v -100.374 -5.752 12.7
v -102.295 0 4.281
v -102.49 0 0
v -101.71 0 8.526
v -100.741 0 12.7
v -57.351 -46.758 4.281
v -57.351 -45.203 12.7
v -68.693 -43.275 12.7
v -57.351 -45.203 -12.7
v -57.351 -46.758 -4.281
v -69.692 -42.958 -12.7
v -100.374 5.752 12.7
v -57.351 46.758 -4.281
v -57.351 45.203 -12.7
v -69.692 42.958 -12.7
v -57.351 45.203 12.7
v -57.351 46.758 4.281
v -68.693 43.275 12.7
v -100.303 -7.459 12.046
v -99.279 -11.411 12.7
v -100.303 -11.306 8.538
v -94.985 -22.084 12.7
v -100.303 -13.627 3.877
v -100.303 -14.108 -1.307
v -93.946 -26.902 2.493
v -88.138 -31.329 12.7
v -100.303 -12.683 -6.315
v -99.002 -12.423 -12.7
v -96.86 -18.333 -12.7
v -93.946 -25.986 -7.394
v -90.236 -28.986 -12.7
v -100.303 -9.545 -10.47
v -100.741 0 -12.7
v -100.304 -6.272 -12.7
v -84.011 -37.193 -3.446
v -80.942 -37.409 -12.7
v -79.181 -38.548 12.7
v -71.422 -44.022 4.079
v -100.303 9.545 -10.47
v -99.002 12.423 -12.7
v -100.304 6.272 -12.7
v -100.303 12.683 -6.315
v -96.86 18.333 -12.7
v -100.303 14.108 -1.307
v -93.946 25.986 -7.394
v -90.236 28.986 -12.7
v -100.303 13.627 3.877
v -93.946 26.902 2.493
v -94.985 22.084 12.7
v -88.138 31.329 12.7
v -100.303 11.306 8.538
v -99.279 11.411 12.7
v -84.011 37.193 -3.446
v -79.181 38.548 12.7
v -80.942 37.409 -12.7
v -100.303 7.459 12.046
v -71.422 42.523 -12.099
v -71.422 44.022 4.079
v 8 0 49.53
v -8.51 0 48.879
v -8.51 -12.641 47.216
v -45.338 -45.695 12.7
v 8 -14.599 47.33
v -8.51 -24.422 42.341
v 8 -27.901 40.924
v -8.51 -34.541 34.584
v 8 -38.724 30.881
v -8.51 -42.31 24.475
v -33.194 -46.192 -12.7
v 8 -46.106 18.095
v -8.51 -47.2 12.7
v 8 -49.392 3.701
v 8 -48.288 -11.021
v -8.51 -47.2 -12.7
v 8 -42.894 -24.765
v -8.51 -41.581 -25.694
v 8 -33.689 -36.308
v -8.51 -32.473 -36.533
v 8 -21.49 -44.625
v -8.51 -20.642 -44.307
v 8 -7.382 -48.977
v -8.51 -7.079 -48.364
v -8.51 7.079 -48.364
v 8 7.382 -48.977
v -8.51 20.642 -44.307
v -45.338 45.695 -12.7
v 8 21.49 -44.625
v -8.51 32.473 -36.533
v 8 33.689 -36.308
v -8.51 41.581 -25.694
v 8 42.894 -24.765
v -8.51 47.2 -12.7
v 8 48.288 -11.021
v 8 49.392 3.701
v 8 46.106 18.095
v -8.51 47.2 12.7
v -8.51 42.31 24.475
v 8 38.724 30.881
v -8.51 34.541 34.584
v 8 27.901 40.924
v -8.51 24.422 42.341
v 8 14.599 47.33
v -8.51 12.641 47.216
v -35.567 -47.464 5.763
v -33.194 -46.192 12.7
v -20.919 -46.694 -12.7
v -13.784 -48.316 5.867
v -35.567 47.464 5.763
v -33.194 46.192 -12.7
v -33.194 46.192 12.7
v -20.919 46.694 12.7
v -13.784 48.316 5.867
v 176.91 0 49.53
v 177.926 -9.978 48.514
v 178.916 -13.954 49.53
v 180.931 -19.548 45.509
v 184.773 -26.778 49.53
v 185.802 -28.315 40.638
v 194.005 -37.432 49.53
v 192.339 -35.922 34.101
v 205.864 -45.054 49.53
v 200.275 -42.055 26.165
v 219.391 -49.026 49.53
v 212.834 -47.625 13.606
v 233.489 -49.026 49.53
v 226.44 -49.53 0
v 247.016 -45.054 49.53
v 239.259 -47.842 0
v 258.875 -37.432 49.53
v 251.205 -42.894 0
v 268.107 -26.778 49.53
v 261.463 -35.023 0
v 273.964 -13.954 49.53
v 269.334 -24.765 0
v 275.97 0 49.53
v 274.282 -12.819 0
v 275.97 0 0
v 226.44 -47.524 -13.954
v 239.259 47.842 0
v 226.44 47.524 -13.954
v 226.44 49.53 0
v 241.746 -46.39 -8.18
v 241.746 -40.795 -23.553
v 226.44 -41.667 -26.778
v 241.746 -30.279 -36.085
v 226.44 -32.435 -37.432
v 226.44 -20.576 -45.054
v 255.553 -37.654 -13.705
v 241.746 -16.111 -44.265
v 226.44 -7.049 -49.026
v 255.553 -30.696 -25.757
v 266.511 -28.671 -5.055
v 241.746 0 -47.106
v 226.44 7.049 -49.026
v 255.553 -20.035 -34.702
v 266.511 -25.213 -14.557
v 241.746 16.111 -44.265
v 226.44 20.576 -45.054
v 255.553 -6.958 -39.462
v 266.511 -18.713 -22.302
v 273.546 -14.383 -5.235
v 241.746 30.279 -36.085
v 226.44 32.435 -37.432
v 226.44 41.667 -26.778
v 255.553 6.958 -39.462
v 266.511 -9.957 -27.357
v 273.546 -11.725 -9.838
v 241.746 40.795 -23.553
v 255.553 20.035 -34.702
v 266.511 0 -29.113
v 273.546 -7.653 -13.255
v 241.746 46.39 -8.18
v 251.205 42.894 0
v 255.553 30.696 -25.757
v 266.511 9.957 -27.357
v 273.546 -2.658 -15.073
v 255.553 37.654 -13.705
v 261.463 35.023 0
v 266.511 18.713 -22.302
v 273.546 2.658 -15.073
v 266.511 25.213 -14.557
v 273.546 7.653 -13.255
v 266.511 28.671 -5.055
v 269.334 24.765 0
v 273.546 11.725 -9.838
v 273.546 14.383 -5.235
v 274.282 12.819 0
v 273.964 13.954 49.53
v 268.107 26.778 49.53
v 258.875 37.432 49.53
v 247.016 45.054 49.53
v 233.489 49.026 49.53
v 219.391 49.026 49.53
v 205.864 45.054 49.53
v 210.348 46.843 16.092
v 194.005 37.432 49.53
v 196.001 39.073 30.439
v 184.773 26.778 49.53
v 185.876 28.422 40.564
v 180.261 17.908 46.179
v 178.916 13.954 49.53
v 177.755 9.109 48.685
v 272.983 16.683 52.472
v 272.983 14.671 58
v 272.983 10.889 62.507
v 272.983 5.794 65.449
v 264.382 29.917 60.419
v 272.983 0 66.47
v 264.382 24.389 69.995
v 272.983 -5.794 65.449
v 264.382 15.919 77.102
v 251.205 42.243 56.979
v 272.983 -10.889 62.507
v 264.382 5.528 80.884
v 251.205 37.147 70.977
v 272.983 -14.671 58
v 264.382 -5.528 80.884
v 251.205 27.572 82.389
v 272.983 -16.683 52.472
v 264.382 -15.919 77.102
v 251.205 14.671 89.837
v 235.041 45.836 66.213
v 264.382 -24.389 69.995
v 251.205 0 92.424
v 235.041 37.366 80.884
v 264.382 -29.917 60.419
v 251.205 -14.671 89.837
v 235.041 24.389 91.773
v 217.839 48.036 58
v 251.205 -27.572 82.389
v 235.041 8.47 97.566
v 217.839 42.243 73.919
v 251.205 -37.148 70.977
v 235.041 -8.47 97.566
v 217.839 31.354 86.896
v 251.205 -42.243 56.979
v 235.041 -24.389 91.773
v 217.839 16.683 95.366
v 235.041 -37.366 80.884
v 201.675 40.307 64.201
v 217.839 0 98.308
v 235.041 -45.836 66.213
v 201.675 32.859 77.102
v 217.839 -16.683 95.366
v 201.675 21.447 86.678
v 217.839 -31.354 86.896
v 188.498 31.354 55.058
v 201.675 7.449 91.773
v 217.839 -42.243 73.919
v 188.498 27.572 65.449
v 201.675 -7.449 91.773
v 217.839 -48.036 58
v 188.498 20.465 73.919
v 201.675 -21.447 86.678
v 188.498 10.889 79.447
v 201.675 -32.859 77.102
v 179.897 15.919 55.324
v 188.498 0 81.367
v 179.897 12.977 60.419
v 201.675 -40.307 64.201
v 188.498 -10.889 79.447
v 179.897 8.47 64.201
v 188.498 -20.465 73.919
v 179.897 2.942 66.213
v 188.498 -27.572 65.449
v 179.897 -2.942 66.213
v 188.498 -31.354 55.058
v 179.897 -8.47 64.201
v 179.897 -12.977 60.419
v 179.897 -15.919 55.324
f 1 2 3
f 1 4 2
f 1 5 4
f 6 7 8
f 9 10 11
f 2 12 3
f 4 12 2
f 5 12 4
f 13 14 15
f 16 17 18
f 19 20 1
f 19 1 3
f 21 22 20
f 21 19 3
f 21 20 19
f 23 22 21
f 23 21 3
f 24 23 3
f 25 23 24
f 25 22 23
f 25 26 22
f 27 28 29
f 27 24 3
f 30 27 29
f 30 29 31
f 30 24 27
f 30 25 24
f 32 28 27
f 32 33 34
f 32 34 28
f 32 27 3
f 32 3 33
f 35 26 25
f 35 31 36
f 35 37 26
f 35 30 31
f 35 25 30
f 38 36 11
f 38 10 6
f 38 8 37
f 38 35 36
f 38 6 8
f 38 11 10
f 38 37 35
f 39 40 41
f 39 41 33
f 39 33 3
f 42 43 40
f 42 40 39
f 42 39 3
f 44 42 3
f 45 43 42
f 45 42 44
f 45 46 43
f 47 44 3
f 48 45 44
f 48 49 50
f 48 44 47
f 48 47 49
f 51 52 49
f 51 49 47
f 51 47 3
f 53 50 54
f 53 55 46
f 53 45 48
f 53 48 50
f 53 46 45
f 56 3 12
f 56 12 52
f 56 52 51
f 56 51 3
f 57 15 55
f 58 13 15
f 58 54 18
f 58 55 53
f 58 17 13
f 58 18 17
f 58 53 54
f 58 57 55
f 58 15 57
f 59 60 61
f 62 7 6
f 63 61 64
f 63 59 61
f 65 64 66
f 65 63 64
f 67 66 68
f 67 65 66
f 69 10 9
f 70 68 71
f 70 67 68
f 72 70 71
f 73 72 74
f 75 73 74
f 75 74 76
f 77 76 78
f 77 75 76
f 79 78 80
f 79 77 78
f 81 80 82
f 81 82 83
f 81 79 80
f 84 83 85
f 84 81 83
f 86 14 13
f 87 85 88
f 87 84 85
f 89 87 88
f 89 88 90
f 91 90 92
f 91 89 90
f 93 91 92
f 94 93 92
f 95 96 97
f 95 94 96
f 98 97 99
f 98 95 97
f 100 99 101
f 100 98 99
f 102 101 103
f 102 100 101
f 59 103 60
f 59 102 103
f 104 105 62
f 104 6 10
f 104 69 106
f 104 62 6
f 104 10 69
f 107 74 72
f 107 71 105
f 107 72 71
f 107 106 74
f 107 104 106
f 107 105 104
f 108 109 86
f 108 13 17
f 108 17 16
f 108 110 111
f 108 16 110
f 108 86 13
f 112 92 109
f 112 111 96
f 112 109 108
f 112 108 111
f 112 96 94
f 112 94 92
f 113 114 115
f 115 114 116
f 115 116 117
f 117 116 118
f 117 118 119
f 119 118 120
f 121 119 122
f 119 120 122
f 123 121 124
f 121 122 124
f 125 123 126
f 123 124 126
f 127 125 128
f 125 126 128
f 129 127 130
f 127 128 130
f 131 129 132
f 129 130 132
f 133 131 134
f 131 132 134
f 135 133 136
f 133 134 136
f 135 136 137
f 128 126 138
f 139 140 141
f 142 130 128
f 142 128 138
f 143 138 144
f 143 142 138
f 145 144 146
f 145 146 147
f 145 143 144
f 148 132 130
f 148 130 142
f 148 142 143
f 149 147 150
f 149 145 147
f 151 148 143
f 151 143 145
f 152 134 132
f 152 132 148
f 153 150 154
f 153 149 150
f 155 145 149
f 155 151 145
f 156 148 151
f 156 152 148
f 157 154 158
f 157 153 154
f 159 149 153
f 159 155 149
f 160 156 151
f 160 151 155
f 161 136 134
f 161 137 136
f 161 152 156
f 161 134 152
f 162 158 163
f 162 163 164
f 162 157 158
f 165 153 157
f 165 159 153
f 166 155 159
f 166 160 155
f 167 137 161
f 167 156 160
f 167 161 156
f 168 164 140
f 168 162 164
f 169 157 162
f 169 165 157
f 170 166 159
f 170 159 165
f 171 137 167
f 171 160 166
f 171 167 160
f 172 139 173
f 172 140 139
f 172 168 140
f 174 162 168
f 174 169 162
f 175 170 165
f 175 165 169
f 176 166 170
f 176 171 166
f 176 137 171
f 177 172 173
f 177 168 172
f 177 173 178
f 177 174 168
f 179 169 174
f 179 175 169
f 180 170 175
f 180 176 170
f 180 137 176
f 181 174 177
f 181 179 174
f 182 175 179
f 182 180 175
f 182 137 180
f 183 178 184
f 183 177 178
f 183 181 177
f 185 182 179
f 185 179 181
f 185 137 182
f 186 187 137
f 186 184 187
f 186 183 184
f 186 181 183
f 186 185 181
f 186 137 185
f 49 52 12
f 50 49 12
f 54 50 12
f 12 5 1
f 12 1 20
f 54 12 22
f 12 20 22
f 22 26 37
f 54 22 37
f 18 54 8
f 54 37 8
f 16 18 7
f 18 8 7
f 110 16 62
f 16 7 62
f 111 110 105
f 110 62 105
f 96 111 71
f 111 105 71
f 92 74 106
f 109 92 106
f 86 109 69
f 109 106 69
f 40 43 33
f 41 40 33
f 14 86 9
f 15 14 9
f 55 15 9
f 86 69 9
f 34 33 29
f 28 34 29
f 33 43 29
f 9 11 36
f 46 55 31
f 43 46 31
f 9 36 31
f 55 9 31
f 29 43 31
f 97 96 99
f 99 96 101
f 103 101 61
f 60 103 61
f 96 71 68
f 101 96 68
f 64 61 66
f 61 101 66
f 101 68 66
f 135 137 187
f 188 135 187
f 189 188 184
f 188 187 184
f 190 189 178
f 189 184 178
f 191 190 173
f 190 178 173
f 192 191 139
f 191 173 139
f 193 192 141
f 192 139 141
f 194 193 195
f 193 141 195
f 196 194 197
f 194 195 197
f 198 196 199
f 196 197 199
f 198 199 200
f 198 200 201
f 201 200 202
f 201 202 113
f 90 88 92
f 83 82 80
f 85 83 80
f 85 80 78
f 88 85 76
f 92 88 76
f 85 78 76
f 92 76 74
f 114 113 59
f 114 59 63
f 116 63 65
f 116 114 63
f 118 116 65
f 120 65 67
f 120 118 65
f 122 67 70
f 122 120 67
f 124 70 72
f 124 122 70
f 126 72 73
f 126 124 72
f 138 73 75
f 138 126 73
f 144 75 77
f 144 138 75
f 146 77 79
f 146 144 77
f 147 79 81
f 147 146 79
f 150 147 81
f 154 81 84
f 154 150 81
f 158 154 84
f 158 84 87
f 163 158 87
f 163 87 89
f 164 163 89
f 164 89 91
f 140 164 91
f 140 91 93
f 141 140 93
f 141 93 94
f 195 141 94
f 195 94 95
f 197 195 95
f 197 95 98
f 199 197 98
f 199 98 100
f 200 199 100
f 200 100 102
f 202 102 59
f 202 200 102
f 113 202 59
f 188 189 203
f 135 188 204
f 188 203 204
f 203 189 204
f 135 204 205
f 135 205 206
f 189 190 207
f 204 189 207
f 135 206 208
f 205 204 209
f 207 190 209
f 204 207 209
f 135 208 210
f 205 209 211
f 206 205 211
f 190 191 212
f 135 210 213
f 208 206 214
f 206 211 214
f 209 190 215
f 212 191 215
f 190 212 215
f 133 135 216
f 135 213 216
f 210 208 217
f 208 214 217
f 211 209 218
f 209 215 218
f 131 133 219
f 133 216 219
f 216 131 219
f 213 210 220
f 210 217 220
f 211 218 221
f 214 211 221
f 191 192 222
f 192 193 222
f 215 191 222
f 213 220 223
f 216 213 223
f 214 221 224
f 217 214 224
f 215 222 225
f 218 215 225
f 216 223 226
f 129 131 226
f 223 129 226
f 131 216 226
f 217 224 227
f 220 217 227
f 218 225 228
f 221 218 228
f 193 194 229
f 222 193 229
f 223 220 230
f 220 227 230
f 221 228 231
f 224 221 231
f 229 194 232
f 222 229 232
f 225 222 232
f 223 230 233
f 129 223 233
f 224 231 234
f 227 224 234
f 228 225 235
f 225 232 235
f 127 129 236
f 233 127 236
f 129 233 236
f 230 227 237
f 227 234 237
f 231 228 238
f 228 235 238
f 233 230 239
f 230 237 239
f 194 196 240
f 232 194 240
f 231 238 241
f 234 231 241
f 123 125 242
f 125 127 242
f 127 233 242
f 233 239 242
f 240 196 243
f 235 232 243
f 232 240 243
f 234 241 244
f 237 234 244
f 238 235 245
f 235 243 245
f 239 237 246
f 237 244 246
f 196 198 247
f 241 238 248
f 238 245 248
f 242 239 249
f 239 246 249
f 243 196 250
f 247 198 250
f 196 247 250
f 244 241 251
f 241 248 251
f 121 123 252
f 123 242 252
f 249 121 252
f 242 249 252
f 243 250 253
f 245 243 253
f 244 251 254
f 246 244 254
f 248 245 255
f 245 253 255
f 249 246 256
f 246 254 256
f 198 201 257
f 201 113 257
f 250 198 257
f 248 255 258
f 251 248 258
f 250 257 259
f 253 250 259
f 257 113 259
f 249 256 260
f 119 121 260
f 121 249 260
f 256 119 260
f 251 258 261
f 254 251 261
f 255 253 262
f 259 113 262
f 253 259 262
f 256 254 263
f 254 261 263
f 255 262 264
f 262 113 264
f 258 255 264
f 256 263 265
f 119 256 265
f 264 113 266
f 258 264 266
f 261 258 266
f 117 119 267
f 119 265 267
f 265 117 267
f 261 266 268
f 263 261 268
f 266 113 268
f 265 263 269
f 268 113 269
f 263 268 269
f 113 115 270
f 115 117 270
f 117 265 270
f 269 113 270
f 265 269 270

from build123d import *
from build123d.topology import SkipClean

# Parameters (mm, degrees)
CUT_EXTRUDE1_DEPTH      = 285.72070999490006
CUT_EXTRUDE1_DEPTH_BACK = 285.72070999490006
SKETCH13_R              = 49.530000000000044
BOSS_EXTRUDE4_DEPTH     = 49.53


with BuildPart() as part:
    # Sketch1 → Revolve1 (revolve)
    with BuildSketch(Plane.XY, mode=Mode.PRIVATE) as revolve1_sk:
        with BuildLine():
            Line((-57.35114817524302, 46.95352330159362), (8.000000000000007, 49.53))
            Line((8.000000000000007, 49.53), (226.43999999999997, 49.529999999999994))
            ThreePointArc((226.43999999999997, 49.529999999999994), (261.4629988721697, 35.022998872169694), (275.96999999999997, 0))
            Line((275.96999999999997, 0), (-102.49, 0))
            ThreePointArc((-102.49, 0), (-89.37510555522056, 32.56589202866499), (-57.35114817524302, 46.95352330159362))
        make_face()
    revolve(revolve1_sk.sketch.rotate(Axis((-1000, 0, 0), (1, 0, 0)), 90), axis=Axis((-1000, 0, 0), (1, 0, 0)))

    # Sketch2 → Cut-Extrude1 (cut, two sides: drawn at the far end of the back side and taken through both)
    with BuildSketch(Plane(origin=(0, 0, 0), x_dir=(1, 0, 0), z_dir=(0, 1, 0)).offset(-CUT_EXTRUDE1_DEPTH_BACK)):
        Polygon((-102.49, 88.9), (-8.50999999999999, 88.9), (-8.50999999999998, 12.700000000000003), (-102.48999999999998, 12.7), align=None)
        Polygon((-102.48999999999998, -12.7), (-8.50999999999998, -12.700000000000003), (-8.50999999999999, -88.9), (-102.49, -88.9), align=None)
    extrude(amount=CUT_EXTRUDE1_DEPTH + CUT_EXTRUDE1_DEPTH_BACK, mode=Mode.SUBTRACT)

    # Sketch13 → Boss-Extrude4 (add)
    with SkipClean():  # the faces are left unmerged after this step: merging them gives an invalid solid
        with BuildSketch(Plane.XY):
            with Locations((226.43999999999997, 0)):
                Circle(SKETCH13_R)
        extrude(amount=BOSS_EXTRUDE4_DEPTH)

    # Sketch14 → Revolve4 (revolve)
    with SkipClean():  # the faces are left unmerged after this step: merging them gives an invalid solid
        with BuildSketch(Plane.XY.offset(49.53)):
            with BuildLine():
                Line((176.90999999999997, 0), (275.96999999999997, 1.82e-14))
                ThreePointArc((275.96999999999997, 1.82e-14), (226.43999999999997, 49.53), (176.90999999999997, 0))
            make_face()
        revolve(axis=Axis((176.90999999999997, 0, 49.53), (1, 1.8e-16, 0)))


solid = part.part
